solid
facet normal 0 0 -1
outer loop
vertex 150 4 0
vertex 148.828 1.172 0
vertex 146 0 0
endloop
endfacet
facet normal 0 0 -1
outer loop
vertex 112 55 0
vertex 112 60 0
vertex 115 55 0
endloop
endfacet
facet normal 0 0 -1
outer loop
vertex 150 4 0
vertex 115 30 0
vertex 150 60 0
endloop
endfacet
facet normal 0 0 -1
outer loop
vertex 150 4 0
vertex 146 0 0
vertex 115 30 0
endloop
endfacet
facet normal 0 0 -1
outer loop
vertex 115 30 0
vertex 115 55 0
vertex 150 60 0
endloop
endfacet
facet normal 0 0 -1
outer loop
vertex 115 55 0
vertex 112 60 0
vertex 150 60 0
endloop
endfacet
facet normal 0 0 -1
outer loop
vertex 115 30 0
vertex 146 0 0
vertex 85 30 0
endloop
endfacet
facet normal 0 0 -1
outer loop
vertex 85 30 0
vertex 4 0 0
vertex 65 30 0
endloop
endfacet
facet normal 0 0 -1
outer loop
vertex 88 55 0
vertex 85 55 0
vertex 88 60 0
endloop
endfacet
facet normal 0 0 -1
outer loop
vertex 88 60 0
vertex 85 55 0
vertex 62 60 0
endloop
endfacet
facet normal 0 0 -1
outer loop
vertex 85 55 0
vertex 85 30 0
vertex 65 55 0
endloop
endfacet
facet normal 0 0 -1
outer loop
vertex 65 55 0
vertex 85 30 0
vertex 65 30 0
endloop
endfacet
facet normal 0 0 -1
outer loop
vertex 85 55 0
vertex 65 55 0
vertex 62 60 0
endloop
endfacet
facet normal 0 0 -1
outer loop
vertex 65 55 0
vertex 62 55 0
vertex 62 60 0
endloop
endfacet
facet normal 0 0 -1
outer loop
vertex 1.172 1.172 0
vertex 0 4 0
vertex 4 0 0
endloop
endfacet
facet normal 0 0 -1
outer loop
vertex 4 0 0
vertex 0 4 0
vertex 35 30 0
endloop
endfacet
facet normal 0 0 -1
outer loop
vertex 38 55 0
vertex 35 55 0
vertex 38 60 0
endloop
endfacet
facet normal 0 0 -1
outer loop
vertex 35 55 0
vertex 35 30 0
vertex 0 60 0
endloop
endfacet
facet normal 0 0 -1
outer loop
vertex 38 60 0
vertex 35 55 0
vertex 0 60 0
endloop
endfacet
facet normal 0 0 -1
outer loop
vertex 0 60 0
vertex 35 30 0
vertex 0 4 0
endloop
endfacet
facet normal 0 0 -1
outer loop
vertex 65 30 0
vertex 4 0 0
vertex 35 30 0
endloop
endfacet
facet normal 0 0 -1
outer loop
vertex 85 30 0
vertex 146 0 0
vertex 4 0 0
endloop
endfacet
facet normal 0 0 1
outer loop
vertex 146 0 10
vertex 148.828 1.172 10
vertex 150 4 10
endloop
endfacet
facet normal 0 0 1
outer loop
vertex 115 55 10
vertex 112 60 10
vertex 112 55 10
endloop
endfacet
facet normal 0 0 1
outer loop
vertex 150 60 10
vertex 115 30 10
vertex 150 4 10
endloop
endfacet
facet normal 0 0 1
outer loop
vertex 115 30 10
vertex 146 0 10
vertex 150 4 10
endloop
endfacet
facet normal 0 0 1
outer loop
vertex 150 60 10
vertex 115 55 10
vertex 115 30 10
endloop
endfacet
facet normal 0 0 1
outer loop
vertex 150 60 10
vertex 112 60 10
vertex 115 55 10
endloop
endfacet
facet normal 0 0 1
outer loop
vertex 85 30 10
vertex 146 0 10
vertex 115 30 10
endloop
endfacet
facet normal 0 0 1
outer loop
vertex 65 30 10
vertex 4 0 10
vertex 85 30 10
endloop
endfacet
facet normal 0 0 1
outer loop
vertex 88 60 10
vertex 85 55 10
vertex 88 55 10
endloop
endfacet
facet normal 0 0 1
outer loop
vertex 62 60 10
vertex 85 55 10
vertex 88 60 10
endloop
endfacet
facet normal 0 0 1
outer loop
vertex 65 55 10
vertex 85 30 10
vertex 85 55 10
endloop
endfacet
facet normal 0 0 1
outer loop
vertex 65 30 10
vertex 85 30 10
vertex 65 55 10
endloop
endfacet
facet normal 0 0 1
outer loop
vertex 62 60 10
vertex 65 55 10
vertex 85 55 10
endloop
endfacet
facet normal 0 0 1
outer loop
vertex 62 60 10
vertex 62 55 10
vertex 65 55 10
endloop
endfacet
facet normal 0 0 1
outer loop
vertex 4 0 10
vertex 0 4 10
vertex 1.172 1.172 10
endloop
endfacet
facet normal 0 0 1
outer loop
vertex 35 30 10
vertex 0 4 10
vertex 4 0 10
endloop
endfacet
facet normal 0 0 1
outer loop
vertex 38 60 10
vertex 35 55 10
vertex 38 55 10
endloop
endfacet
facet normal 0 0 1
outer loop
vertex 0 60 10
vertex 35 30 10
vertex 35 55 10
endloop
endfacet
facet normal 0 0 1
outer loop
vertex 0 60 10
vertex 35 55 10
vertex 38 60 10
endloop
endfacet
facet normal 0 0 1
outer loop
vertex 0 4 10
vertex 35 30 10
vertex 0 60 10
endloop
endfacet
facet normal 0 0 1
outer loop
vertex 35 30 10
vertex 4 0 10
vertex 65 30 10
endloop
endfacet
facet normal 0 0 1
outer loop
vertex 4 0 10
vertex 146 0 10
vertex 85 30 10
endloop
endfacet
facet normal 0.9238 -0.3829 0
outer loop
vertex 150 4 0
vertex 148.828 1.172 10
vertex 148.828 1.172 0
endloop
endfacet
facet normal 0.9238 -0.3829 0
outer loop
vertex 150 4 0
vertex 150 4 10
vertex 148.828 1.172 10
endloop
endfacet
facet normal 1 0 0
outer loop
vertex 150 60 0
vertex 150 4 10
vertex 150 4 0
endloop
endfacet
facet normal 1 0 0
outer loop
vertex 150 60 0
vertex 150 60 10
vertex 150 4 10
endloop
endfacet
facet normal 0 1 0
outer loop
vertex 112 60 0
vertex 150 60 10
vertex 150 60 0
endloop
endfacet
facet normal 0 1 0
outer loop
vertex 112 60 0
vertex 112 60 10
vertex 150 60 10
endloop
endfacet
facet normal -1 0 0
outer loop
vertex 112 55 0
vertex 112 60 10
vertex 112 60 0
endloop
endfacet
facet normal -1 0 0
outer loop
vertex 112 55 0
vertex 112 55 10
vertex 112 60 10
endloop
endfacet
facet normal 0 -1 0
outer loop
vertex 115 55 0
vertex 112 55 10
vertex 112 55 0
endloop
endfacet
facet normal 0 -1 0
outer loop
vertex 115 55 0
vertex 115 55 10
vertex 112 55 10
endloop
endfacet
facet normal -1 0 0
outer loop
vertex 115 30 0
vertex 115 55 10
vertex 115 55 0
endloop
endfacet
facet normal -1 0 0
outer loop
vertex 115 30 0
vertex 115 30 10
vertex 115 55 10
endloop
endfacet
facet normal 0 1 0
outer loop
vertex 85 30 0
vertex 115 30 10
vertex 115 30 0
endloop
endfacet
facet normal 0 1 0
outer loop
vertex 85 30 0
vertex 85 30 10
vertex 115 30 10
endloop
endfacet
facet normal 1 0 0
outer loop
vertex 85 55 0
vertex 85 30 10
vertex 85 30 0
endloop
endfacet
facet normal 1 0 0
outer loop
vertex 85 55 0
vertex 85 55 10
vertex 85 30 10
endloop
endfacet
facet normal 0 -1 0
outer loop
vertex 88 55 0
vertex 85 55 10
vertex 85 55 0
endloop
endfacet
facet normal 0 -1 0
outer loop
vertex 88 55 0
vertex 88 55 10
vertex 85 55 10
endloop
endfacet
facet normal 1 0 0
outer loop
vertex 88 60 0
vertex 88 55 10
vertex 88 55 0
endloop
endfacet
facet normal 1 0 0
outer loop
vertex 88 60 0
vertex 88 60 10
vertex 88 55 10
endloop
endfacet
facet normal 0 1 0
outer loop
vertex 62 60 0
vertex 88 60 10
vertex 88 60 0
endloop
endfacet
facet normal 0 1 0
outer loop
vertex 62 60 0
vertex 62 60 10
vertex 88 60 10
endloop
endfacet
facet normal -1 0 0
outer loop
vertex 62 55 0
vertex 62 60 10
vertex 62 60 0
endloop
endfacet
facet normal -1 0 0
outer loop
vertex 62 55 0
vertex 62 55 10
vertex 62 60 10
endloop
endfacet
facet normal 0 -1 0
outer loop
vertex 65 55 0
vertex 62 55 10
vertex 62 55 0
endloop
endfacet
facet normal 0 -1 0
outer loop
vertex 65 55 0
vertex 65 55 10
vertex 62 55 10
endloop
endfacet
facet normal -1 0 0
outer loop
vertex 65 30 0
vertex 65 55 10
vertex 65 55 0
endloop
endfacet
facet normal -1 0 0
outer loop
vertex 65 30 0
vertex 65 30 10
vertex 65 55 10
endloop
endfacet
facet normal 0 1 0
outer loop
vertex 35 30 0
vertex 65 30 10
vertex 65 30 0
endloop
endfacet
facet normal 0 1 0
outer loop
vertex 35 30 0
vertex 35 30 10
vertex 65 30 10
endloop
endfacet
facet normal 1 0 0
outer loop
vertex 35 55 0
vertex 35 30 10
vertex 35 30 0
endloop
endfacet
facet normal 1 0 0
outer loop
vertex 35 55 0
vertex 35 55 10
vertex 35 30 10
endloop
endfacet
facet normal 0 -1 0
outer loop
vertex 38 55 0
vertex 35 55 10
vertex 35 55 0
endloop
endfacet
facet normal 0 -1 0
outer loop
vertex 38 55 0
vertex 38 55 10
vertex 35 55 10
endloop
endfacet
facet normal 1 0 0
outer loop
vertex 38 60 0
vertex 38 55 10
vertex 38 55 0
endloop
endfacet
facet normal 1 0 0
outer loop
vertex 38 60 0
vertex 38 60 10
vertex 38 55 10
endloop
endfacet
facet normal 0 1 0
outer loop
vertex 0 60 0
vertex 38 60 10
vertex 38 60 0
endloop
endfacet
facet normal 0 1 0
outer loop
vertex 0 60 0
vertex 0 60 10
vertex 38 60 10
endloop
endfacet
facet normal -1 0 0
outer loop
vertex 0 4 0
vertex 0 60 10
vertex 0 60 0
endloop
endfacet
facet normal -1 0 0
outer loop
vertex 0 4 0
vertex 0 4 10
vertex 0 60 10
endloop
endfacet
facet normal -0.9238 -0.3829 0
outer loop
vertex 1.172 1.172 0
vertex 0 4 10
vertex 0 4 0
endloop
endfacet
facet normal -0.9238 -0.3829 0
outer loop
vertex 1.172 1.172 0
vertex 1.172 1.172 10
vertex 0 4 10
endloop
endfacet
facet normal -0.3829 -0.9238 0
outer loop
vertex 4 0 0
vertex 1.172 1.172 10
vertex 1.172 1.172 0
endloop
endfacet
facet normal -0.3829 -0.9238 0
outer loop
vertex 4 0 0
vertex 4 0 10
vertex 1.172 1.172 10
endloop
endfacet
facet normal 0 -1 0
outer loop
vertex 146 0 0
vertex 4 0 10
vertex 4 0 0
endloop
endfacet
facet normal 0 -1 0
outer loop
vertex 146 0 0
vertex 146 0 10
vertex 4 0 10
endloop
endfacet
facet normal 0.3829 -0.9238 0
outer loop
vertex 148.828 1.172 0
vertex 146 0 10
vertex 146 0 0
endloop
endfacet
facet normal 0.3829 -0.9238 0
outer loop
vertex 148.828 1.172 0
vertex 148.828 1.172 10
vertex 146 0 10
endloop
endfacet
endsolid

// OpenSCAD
$fn = 32;

// ----------------------------------------------------------------------
// Oversize slot bar: 150 mm bar with 2 oversize windows
// ----------------------------------------------------------------------

// --- parameters (mm) ---
profile_height = 10;      // extrusion height
profile_points = 24;      // points of the closed outline

profile = [[0, 4], [1.172, 1.172], [4, 0], [146, 0], [148.828, 1.172], [150, 4], [150, 60], [112, 60], [112, 55], [115, 55], [115, 30], [85, 30], [85, 55], [88, 55], [88, 60], [62, 60], [62, 55], [65, 55], [65, 30], [35, 30], [35, 55], [38, 55], [38, 60], [0, 60]];  // single closed polygon, 24 points, counter clockwise

// --- the one profile operation ---
linear_extrude(height = profile_height) polygon(points = profile);
